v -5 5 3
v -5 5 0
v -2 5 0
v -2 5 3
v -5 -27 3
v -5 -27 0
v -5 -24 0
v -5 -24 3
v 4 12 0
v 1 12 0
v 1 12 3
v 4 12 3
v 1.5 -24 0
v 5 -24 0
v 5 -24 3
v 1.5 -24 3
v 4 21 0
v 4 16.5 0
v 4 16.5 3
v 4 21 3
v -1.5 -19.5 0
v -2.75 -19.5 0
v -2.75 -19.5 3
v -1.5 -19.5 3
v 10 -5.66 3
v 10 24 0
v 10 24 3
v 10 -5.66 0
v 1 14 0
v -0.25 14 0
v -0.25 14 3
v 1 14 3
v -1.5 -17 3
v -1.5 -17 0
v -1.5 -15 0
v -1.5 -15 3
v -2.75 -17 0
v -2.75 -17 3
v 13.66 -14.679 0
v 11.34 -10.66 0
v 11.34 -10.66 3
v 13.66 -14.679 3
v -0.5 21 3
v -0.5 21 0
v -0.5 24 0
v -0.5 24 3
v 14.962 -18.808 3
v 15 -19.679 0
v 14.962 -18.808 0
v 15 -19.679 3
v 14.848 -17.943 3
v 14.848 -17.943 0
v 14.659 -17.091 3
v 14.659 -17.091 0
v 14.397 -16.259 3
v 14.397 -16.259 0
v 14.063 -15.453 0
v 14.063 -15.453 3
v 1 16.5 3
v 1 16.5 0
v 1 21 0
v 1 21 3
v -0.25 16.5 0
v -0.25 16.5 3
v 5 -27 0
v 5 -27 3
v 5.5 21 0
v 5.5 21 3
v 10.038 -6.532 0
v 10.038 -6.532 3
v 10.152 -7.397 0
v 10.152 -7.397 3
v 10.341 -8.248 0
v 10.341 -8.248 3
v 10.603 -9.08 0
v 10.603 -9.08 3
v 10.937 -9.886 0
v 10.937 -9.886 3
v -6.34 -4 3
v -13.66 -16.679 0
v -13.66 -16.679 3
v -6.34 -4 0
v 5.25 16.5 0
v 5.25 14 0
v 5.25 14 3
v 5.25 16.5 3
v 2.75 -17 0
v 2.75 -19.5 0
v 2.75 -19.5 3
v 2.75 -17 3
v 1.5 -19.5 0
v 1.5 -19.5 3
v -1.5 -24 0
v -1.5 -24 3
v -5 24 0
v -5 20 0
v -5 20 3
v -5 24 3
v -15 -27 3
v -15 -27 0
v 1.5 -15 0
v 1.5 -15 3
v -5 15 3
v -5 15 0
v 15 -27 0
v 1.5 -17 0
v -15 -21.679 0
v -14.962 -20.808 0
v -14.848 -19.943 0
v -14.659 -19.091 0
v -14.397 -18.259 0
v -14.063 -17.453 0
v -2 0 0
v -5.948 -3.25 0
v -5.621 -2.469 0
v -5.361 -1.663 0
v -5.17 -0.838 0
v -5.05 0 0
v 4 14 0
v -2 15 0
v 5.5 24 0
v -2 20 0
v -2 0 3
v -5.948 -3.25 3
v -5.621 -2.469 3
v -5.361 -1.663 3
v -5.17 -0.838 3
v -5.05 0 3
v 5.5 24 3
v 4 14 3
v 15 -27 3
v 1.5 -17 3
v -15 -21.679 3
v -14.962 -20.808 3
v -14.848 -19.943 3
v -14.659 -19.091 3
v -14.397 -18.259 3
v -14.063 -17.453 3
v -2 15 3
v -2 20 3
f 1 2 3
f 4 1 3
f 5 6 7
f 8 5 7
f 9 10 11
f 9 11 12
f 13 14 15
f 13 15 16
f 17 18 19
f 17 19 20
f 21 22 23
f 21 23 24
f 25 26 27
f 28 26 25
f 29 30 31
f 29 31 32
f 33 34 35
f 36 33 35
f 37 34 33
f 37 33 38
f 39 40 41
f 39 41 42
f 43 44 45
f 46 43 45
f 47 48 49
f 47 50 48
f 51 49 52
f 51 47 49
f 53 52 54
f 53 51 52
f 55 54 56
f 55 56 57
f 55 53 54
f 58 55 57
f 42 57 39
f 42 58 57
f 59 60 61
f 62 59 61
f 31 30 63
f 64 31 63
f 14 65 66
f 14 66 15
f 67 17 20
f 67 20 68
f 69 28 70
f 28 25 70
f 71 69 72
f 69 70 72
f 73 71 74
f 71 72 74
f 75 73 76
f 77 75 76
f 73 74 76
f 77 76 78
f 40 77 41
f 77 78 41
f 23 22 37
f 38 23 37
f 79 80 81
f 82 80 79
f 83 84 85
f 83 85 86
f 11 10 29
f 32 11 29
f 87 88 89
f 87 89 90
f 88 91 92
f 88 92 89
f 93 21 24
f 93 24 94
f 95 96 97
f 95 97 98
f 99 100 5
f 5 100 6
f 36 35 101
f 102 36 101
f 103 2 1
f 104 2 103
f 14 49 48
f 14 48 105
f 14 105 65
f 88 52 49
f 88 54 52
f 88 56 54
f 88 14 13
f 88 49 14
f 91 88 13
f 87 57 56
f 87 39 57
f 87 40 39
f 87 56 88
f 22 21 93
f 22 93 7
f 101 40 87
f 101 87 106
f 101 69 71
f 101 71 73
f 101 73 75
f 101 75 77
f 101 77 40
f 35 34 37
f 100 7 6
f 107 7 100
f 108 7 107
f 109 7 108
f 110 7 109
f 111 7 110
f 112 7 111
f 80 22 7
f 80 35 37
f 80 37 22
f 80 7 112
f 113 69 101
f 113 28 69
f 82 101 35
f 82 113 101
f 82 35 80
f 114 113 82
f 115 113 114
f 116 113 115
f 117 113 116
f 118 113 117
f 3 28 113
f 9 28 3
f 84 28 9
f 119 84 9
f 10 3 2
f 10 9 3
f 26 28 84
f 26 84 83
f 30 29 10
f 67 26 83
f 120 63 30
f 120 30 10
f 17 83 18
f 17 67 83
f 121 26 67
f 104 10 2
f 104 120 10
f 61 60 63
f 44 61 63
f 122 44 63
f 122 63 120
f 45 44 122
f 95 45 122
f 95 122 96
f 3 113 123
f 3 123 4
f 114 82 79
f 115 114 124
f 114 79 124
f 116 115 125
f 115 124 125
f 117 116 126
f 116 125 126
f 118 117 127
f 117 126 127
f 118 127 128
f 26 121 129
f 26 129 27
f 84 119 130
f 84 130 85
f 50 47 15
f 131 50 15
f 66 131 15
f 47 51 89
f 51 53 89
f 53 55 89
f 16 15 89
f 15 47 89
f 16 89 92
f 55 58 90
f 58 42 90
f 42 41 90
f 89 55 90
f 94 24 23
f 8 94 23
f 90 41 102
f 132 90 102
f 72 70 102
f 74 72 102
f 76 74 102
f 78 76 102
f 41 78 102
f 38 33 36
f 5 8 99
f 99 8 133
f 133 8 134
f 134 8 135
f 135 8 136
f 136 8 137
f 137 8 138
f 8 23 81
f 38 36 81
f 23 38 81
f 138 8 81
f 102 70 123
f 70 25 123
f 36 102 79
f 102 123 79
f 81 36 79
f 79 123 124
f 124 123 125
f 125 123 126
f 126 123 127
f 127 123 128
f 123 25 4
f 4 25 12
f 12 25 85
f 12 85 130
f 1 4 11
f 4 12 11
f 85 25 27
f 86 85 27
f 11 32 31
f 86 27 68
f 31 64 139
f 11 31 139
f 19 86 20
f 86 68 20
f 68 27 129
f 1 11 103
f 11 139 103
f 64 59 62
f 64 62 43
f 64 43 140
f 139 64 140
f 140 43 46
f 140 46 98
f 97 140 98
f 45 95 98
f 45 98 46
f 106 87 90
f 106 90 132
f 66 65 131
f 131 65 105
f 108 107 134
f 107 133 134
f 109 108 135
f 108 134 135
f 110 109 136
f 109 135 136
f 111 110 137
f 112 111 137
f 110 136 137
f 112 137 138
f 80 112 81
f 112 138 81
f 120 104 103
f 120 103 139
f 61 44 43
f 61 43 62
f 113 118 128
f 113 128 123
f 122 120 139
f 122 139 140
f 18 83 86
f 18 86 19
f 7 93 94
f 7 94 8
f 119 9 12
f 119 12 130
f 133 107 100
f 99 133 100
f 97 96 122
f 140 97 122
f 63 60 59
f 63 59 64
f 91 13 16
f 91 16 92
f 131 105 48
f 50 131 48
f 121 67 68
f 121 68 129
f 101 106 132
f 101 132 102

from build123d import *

# Parameters (mm, degrees)
CROQUIS1_W              = 10
CROQUIS1_H              = 3
SALIENTE_EXTRUIR1_DEPTH = 3
REDONDEO1_R             = 10
CROQUIS2_W              = 6
CROQUIS2_H              = 3
CORTAR_EXTRUIR1_DEPTH   = 3
CROQUIS3_W              = 1.25
CROQUIS3_H              = 2.5
CROQUIS3_W_2            = 3
CROQUIS3_H_2            = 7.5
CROQUIS3_H_3            = 2
CORTAR_EXTRUIR2_DEPTH   = 32.032241298
CROQUIS4_W              = 3
CROQUIS4_H              = 5
CROQUIS4_W_2            = 4
CORTAR_EXTRUIR3_DEPTH   = 32.032241298
CROQUIS5_W              = 3
CROQUIS5_H              = 7.5
CROQUIS5_H_2            = 2.5
CROQUIS5_W_2            = 1.25
CROQUIS5_H_3            = 2
CORTAR_EXTRUIR4_DEPTH   = 32.032241298


with BuildPart() as part:
    # Croquis1 → Saliente-Extruir1 (new body)
    with BuildSketch(Plane.XY):
        Polygon((15, -17), (15, -24), (-15, -24), (-15, -19), (-5, -1.679491924), (-5, 24), (10, 24), (10, -8.339745962), align=None)
        with Locations((-10, -25.5)):
            Rectangle(CROQUIS1_W, CROQUIS1_H)
        with Locations((10, -25.5)):
            Rectangle(CROQUIS1_W, CROQUIS1_H)
    extrude(amount=SALIENTE_EXTRUIR1_DEPTH)

    # Redondeo1
    redondeo1_edges = [part.edges().sort_by_distance(p)[0] for p in [
        (-15, -19, 1.5),
        (-5, -1.679491924, 1.5),
        (10, -8.339745962, 1.5),
        (15, -17, 1.5),
    ]]
    fillet(redondeo1_edges, radius=REDONDEO1_R)

    # Croquis2 → Cortar-Extruir1 (cut)
    with BuildSketch(Plane.XY):
        with Locations((2.5, 22.5)):
            Rectangle(CROQUIS2_W, CROQUIS2_H)
    extrude(amount=CORTAR_EXTRUIR1_DEPTH, mode=Mode.SUBTRACT)

    # Croquis3 → Cortar-Extruir2 (cut, through all)
    with BuildSketch(Plane.XY):
        with Locations((0.375, 15.25)):
            Rectangle(CROQUIS3_W, CROQUIS3_H)
        with Locations((2.5, 15.25)):
            Rectangle(CROQUIS3_W_2, CROQUIS3_H)
        with Locations((4.625, 15.25)):
            Rectangle(CROQUIS3_W, CROQUIS3_H)
        with Locations((2.5, 20.25)):
            Rectangle(CROQUIS3_W_2, CROQUIS3_H_2)
        with Locations((2.5, 13)):
            Rectangle(CROQUIS3_W_2, CROQUIS3_H_3)
    extrude(amount=CORTAR_EXTRUIR2_DEPTH, mode=Mode.SUBTRACT)

    # Croquis4 → Cortar-Extruir3 (cut, through all)
    with BuildSketch(Plane.XY):
        with Locations((-3.5, 17.5)):
            Rectangle(CROQUIS4_W, CROQUIS4_H)
        with Locations((-4, 2.5)):
            Rectangle(CROQUIS4_W_2, CROQUIS4_H)
    extrude(amount=CORTAR_EXTRUIR3_DEPTH, mode=Mode.SUBTRACT)

    # Croquis5 → Cortar-Extruir4 (cut, through all)
    with BuildSketch(Plane.XY):
        with Locations((0, -23.25)):
            Rectangle(CROQUIS5_W, CROQUIS5_H)
        with Locations((0, -18.25)):
            Rectangle(CROQUIS5_W, CROQUIS5_H_2)
        with Locations((-2.125, -18.25)):
            Rectangle(CROQUIS5_W_2, CROQUIS5_H_2)
        with Locations((2.125, -18.25)):
            Rectangle(CROQUIS5_W_2, CROQUIS5_H_2)
        with Locations((0, -16)):
            Rectangle(CROQUIS5_W, CROQUIS5_H_3)
    extrude(amount=CORTAR_EXTRUIR4_DEPTH, mode=Mode.SUBTRACT)


solid = part.part
